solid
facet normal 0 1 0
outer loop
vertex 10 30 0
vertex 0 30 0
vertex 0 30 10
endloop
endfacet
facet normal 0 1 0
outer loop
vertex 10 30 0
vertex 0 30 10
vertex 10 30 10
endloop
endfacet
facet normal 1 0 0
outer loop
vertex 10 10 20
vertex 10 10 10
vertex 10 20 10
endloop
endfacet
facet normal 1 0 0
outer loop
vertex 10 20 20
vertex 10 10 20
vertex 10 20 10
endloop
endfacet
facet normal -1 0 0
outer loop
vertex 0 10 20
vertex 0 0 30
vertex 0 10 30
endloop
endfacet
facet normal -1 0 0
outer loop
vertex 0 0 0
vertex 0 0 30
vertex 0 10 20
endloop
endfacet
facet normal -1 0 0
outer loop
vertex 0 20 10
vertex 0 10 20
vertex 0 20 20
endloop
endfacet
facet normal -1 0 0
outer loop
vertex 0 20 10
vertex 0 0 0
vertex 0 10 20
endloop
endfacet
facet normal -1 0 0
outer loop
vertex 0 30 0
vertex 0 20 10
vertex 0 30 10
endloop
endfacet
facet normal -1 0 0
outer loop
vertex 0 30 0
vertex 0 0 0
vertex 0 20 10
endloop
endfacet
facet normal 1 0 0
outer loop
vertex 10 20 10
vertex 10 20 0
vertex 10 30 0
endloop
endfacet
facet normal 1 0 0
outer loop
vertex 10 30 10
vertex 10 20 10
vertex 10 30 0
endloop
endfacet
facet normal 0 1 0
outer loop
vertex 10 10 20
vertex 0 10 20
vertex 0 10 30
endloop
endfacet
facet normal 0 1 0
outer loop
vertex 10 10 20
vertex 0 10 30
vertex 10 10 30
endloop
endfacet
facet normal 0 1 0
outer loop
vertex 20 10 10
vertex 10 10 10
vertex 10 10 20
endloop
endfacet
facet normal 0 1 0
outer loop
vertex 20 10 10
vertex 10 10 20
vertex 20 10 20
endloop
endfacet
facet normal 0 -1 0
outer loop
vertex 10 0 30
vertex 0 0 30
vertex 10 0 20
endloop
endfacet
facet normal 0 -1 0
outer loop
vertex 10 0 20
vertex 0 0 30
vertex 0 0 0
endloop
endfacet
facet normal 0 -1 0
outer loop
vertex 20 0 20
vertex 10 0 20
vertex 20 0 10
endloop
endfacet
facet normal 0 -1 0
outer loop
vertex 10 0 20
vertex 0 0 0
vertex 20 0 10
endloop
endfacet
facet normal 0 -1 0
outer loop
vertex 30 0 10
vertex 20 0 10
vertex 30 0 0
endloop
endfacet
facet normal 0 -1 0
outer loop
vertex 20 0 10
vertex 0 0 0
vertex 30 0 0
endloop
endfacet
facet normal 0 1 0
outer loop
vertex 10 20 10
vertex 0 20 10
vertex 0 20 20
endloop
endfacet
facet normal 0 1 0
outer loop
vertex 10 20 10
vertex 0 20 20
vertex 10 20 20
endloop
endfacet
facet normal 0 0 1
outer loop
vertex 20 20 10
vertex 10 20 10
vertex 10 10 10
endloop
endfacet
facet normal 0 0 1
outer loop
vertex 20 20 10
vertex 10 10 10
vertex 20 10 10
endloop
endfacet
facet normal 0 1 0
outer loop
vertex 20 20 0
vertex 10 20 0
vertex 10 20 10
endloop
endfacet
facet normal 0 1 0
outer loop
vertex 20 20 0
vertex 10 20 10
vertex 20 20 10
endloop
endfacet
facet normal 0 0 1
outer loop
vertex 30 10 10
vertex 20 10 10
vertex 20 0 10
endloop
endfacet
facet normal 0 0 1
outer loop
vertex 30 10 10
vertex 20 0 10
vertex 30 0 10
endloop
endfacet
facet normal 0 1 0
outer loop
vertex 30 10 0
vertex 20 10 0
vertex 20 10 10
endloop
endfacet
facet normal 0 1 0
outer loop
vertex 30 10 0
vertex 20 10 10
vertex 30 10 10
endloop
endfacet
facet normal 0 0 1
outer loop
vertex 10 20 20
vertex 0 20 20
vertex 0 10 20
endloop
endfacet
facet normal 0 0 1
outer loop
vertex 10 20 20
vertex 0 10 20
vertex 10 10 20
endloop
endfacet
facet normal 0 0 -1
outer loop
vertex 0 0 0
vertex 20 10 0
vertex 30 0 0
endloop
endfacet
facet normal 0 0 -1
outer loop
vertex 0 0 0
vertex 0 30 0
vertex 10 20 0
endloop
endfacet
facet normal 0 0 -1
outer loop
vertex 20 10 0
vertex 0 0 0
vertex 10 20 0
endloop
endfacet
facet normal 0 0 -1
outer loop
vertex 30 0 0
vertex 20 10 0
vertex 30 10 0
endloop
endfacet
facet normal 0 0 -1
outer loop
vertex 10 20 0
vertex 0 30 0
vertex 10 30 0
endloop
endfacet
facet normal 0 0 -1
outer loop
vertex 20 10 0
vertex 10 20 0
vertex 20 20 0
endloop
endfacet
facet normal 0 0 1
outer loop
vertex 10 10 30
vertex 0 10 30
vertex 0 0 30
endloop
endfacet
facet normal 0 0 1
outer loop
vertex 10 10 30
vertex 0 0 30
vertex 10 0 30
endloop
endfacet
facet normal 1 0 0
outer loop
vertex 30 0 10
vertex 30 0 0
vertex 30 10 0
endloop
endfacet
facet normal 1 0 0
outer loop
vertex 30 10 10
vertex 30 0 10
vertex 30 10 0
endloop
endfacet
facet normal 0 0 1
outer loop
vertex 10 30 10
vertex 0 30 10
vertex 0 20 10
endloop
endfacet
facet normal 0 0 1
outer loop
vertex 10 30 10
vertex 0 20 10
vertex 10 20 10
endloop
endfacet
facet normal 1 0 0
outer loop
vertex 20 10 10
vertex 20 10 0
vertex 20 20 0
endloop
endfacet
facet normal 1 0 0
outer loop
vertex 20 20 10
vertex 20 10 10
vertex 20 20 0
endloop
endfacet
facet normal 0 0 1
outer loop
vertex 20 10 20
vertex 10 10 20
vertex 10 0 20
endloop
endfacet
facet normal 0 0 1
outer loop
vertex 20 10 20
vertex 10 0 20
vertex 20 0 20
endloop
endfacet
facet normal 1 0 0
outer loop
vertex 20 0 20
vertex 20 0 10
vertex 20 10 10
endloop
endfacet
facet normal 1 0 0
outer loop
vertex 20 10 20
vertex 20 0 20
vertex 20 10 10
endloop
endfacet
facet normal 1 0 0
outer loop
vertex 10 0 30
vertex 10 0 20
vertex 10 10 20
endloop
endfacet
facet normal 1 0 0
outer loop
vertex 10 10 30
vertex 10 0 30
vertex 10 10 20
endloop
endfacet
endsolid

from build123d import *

# Parameters (mm, degrees)
BOX_W        = 10
BOX_H        = 10
BOX_DEPTH    = 30
BOX001_W     = 10
BOX001_H     = 10
BOX001_DEPTH = 20
BOX002_W     = 10
BOX002_H     = 10
BOX002_DEPTH = 20
BOX003_W     = 10
BOX003_H     = 10
BOX003_DEPTH = 10
BOX004_W     = 10
BOX004_H     = 10
BOX004_DEPTH = 10
BOX005_W     = 10
BOX005_H     = 10
BOX005_DEPTH = 10


with BuildPart() as cube:
    # Box → Box (new body)
    with BuildSketch(Plane.XY):
        with Locations((5, 5)):
            Rectangle(BOX_W, BOX_H)
    extrude(amount=BOX_DEPTH)


with BuildPart() as cube001:
    # Box001 → Box001 (new body)
    with BuildSketch(Plane(origin=(10, 0, 0), x_dir=(1, 0, 0), z_dir=(0, 0, 1))):
        with Locations((5, 5)):
            Rectangle(BOX001_W, BOX001_H)
    extrude(amount=BOX001_DEPTH)


with BuildPart() as cube002:
    # Box002 → Box002 (new body)
    with BuildSketch(Plane(origin=(0, 10, 0), x_dir=(1, 0, 0), z_dir=(0, 0, 1))):
        with Locations((5, 5)):
            Rectangle(BOX002_W, BOX002_H)
    extrude(amount=BOX002_DEPTH)


with BuildPart() as cube003:
    # Box003 → Box003 (new body)
    with BuildSketch(Plane(origin=(20, 0, 0), x_dir=(1, 0, 0), z_dir=(0, 0, 1))):
        with Locations((5, 5)):
            Rectangle(BOX003_W, BOX003_H)
    extrude(amount=BOX003_DEPTH)


with BuildPart() as cube004:
    # Box004 → Box004 (new body)
    with BuildSketch(Plane(origin=(0, 20, 0), x_dir=(1, 0, 0), z_dir=(0, 0, 1))):
        with Locations((5, 5)):
            Rectangle(BOX004_W, BOX004_H)
    extrude(amount=BOX004_DEPTH)


with BuildPart() as fusion:
    # Box005 → Box005 (new body)
    with BuildSketch(Plane(origin=(10, 10, 0), x_dir=(1, 0, 0), z_dir=(0, 0, 1))):
        with Locations((5, 5)):
            Rectangle(BOX005_W, BOX005_H)
    extrude(amount=BOX005_DEPTH)

    # Fusion: union Cube, Cube001, Cube002, Cube003, Cube004
    add(cube.part)
    add(cube001.part)
    add(cube002.part)
    add(cube003.part)
    add(cube004.part)


solid = fusion.part
